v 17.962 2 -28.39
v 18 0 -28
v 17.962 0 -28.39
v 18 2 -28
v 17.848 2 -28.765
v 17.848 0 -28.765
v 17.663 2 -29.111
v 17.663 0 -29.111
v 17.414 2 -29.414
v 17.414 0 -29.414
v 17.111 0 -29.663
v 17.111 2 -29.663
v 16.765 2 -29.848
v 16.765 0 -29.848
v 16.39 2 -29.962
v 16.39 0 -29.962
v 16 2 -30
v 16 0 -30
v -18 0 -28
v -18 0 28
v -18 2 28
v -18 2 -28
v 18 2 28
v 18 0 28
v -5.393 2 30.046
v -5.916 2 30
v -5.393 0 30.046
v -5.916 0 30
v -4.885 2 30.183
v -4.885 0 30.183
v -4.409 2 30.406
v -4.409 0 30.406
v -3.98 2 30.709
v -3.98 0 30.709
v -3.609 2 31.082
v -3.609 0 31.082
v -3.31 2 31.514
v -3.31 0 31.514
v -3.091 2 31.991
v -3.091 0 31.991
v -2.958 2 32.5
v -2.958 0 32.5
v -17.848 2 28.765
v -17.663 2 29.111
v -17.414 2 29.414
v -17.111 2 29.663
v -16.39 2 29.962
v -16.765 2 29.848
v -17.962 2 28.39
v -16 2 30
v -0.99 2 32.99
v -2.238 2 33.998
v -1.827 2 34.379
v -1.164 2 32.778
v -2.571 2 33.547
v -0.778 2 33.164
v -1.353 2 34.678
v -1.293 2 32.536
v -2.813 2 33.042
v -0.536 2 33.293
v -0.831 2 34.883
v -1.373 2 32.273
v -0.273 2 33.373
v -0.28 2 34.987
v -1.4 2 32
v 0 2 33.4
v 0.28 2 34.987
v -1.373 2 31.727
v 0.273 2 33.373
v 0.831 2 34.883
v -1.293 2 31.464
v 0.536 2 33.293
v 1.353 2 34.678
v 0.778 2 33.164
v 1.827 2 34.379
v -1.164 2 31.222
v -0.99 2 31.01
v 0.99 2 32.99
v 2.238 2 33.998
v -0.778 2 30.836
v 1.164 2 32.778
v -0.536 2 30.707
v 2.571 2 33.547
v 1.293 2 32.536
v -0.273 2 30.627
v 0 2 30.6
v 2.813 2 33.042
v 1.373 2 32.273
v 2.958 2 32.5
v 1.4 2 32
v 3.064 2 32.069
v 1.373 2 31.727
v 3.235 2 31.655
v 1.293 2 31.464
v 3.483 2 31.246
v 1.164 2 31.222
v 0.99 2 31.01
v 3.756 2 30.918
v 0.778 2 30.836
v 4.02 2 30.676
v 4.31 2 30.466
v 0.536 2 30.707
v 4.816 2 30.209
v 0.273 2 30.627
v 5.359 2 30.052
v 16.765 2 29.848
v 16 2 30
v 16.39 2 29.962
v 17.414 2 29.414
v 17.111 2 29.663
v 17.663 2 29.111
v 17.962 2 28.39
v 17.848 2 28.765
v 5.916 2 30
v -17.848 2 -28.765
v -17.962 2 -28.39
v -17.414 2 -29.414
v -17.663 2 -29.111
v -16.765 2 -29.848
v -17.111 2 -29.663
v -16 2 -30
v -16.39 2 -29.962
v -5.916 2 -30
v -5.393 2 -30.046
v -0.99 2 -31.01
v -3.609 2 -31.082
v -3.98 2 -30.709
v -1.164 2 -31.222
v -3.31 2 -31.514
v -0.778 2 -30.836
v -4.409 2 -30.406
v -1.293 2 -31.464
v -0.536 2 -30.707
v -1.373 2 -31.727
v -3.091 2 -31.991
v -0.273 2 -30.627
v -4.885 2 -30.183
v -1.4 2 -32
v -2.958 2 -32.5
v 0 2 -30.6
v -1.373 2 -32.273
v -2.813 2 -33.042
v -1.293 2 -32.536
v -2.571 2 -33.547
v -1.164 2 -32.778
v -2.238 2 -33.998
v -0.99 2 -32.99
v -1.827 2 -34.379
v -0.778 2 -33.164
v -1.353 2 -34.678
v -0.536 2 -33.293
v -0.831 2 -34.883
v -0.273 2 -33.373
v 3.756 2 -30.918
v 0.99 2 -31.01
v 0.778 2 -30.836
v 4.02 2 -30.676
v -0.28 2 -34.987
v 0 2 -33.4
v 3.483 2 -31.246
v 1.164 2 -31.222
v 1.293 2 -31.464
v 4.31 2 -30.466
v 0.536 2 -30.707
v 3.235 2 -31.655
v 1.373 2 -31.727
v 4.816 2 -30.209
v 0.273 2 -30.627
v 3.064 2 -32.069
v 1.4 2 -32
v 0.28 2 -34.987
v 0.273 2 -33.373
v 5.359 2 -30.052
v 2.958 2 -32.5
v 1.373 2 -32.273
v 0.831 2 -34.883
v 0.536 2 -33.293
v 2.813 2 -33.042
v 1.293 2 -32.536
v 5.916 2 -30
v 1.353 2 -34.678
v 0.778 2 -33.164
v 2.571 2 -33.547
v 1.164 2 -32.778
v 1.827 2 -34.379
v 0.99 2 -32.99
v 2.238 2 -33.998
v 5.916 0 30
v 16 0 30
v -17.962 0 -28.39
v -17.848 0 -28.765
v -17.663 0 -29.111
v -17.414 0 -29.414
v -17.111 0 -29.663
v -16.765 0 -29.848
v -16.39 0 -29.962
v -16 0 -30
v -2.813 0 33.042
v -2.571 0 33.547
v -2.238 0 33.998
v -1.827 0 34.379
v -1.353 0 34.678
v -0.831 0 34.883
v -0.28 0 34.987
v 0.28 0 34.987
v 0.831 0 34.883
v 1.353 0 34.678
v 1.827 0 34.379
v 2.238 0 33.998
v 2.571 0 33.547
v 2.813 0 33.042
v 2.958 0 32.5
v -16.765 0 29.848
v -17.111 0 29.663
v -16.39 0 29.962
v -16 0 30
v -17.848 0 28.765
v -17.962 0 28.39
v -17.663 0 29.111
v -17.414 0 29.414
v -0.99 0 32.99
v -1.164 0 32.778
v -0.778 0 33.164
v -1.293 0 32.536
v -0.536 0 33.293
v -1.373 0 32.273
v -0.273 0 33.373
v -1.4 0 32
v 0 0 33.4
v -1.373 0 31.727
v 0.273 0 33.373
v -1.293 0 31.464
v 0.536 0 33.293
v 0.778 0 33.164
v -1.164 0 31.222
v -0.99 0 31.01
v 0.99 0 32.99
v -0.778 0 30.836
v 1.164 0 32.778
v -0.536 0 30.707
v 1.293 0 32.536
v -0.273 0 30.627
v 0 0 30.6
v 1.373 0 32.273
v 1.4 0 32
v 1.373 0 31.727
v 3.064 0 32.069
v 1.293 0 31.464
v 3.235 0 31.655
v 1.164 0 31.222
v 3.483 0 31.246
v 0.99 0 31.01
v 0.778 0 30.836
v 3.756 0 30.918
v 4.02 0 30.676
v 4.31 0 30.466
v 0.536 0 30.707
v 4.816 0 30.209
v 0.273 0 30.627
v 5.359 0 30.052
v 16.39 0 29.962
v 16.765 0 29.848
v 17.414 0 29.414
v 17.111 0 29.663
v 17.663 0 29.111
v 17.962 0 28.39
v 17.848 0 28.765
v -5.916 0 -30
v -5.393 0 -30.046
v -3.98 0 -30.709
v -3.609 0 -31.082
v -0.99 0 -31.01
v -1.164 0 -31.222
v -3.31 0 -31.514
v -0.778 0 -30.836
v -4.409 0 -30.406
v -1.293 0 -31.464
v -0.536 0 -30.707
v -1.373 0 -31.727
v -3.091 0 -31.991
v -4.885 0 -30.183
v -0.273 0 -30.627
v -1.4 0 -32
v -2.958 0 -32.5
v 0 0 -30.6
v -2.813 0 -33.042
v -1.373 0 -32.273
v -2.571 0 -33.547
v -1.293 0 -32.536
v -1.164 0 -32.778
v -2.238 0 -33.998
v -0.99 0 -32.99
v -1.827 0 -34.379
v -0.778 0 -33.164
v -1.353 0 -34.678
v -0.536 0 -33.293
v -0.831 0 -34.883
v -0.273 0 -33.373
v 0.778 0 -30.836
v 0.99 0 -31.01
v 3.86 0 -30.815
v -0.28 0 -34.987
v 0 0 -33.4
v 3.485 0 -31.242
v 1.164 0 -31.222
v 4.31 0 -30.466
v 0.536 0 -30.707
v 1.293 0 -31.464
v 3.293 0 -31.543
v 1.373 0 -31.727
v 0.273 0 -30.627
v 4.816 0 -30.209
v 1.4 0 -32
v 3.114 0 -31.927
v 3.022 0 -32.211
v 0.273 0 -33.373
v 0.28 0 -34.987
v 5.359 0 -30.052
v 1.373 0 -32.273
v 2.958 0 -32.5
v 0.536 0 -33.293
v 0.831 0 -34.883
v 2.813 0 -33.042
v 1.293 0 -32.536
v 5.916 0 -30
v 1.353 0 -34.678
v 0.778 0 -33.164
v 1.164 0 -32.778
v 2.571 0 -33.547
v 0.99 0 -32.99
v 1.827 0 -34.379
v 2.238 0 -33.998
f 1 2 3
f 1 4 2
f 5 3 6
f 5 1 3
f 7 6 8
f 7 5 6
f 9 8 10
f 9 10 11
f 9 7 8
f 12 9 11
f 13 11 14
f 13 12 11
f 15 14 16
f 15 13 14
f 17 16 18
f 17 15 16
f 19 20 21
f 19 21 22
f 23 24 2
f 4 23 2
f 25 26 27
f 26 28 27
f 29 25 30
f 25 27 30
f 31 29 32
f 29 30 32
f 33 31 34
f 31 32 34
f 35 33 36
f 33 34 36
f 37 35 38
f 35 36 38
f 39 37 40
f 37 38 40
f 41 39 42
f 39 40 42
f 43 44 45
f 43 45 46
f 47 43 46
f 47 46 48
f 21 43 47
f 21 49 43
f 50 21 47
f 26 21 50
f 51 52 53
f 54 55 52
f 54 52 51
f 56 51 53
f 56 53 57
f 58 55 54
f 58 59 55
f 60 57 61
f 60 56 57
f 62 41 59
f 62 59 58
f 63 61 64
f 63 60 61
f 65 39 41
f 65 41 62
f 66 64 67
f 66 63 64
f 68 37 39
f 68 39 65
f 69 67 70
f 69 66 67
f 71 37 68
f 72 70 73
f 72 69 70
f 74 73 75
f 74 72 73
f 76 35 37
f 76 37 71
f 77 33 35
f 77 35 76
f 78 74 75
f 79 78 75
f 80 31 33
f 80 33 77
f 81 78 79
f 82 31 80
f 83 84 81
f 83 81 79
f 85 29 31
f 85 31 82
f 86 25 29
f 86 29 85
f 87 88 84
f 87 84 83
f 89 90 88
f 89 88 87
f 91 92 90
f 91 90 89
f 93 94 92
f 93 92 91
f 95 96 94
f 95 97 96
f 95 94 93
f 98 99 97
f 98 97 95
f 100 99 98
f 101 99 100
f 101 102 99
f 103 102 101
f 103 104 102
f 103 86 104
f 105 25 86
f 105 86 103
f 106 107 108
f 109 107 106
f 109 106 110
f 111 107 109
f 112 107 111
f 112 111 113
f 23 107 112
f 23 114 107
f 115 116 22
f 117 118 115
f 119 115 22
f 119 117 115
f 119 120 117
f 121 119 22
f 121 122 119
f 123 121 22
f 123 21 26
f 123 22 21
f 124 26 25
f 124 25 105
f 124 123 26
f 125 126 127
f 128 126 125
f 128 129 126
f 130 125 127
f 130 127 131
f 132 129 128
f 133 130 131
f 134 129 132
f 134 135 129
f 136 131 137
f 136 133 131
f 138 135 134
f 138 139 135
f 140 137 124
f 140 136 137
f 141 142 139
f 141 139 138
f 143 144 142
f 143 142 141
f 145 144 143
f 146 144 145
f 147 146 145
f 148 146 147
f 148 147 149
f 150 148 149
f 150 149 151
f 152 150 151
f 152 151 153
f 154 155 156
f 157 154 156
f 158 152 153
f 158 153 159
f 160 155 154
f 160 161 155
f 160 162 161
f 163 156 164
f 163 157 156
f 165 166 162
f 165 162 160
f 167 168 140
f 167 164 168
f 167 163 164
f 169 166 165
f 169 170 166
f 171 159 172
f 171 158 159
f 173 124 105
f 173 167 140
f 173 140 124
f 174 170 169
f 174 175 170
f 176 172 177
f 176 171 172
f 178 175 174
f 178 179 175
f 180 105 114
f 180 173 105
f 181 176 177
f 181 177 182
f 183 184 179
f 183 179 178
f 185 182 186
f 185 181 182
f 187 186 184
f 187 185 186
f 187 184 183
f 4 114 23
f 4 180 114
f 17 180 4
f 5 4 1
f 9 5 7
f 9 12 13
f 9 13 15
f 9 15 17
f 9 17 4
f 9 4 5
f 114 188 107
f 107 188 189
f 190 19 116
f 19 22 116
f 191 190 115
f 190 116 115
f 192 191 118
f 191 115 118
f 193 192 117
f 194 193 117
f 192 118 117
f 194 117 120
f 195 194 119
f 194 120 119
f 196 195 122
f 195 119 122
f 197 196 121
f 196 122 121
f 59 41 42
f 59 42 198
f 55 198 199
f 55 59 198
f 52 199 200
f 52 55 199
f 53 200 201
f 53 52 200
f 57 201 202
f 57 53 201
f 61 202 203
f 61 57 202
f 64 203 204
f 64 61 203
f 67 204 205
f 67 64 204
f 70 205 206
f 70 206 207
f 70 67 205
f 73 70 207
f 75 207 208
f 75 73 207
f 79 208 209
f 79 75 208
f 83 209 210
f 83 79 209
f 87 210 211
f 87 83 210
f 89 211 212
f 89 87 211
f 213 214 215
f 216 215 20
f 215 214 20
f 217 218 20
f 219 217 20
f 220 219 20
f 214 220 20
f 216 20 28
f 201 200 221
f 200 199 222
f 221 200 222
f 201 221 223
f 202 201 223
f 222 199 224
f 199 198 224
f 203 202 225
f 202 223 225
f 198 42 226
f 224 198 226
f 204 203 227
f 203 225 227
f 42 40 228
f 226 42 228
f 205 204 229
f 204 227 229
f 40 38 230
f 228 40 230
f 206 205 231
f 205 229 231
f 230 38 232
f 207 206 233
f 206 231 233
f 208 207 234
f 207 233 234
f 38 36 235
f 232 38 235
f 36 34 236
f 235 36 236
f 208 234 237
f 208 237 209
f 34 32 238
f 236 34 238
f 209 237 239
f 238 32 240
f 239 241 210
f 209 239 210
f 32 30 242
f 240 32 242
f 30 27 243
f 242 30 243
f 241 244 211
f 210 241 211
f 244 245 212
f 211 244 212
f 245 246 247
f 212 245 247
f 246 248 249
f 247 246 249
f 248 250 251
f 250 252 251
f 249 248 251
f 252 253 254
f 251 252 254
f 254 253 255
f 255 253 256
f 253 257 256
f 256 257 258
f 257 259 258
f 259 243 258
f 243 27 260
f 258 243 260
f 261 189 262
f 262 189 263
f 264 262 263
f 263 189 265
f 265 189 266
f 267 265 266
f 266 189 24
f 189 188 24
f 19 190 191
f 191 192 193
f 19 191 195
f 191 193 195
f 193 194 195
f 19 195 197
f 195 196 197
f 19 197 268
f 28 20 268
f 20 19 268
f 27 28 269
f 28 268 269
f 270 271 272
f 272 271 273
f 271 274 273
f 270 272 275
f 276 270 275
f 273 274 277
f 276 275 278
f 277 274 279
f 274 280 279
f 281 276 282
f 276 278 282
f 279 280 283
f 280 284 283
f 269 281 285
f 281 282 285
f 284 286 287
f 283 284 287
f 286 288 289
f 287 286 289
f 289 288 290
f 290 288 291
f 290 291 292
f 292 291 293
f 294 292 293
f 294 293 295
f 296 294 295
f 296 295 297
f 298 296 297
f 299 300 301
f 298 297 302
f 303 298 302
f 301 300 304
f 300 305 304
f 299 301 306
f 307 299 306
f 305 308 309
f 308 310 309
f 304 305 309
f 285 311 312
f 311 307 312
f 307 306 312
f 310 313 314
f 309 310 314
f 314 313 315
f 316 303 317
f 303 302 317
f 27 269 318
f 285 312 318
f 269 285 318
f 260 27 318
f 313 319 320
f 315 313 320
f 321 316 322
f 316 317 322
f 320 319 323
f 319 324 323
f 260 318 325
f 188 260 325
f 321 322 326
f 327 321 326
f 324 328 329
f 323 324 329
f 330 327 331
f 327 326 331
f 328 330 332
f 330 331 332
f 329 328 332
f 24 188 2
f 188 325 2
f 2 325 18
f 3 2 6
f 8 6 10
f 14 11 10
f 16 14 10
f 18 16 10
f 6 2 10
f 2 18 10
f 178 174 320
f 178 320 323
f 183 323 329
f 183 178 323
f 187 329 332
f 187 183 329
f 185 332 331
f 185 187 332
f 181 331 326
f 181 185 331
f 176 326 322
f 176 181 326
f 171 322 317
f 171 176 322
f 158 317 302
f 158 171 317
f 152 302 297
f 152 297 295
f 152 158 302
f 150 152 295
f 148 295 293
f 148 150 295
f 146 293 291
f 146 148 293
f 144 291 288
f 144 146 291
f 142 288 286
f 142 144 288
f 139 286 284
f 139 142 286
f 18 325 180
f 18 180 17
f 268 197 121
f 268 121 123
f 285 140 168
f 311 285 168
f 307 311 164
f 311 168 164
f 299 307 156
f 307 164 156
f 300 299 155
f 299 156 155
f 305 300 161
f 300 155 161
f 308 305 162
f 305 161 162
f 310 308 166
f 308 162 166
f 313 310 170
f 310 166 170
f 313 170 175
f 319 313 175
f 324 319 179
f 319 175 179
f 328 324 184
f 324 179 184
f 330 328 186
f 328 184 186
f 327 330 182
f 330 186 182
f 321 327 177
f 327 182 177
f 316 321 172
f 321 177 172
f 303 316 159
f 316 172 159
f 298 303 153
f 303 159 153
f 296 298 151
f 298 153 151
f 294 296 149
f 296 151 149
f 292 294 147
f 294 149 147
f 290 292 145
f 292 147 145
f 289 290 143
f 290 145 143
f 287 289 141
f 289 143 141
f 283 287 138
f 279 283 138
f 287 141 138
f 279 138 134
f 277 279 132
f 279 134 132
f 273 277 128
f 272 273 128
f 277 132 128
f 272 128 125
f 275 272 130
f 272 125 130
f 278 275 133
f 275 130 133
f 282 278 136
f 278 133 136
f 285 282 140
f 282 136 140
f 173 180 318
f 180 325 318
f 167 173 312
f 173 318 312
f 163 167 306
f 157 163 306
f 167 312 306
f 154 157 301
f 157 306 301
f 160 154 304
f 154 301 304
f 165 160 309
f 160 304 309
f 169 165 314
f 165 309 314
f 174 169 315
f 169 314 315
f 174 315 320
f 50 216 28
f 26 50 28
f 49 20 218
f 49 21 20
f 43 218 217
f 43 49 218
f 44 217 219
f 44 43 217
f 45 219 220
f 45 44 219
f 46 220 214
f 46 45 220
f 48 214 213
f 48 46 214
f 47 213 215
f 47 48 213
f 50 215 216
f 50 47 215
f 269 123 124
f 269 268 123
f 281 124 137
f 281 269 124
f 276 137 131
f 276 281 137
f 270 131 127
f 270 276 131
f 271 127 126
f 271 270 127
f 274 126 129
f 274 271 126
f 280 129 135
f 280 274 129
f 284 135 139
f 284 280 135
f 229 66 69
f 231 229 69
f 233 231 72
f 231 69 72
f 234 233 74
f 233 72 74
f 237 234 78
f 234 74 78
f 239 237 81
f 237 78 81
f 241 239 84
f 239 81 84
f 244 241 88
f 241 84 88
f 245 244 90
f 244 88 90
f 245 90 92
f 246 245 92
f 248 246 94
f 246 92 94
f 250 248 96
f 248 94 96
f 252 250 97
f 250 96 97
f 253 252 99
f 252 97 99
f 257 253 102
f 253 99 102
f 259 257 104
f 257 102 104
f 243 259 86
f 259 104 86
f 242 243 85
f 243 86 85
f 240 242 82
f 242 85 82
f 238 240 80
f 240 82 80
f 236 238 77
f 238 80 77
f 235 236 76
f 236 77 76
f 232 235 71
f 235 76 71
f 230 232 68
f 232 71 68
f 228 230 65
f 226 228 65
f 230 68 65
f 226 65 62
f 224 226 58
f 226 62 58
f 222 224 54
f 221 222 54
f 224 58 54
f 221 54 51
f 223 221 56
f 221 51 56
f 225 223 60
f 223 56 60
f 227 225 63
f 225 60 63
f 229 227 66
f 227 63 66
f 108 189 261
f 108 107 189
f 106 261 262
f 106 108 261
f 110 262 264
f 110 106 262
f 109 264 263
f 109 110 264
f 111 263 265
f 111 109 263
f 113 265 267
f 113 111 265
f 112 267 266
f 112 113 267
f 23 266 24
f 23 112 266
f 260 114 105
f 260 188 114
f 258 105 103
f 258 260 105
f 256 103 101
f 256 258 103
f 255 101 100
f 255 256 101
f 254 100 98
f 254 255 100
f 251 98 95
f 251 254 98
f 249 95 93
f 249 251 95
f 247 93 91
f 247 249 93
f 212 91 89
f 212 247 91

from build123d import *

# Parameters (mm, degrees)
SKETCH_1_W      = 36
SKETCH_1_H      = 60
EXTRUDE_1_DEPTH = 2
FILLET_1_R      = 2
SKETCH_2_R      = 1.4
EXTRUDE_2_DEPTH = 2
FILLET_2_R      = 3


with BuildPart() as part:
    # 草图1 → 凸台-拉伸1 (new body)
    with BuildSketch(Plane(origin=(0, 0, 0), x_dir=(1, 0, 0), z_dir=(0, 1, 0))):
        Rectangle(SKETCH_1_W, SKETCH_1_H)
    extrude(amount=EXTRUDE_1_DEPTH)

    # 圆角1
    fillet_1_edges = [part.edges().sort_by_distance(p)[0] for p in [
        (-18, 1, -30),
        (18, 1, -30),
        (18, 1, 30),
        (-18, 1, 30),
    ]]
    fillet(fillet_1_edges, radius=FILLET_1_R)

    # 草图2 → 凸台-拉伸2 (add)
    # profile 1 of 2: a face of its own
    with BuildSketch(Plane(origin=(0, 2, 0), x_dir=(1, 0, 0), z_dir=(0, 1, 0))):
        with BuildLine():
            ThreePointArc((2.236067977, 30), (2.802517077, 30.929533731), (3, 32))
            ThreePointArc((3, 32), (-1.070466269, 34.802517077), (-2.236067977, 30))
            Line((-2.236067977, 30), (2.236067977, 30))
        make_face()
        with Locations(Location((0, 32, 0), (0, 0, 270))):
            Circle(SKETCH_2_R, mode=Mode.SUBTRACT)
    # profile 2 of 2: a face of its own
    with BuildSketch(Plane(origin=(0, 2, 0), x_dir=(1, 0, 0), z_dir=(0, 1, 0))):
        with BuildLine():
            ThreePointArc((-2.236067977, -30), (-1.070466269, -34.802517077), (3, -32))
            ThreePointArc((3, -32), (2.802517077, -30.929533731), (2.236067977, -30))
            Line((2.236067977, -30), (-2.236067977, -30))
        make_face()
        with Locations(Location((0, -32, 0), (0, 0, 270))):
            Circle(SKETCH_2_R, mode=Mode.SUBTRACT)
    extrude(amount=-EXTRUDE_2_DEPTH)

    # 圆角2
    fillet_2_edges = [part.edges().sort_by_distance(p)[0] for p in [
        (2.236067977, 1, -30),
        (-2.236067977, 1, -30),
        (2.236067977, 1, 30),
        (-2.236067977, 1, 30),
    ]]
    fillet(fillet_2_edges, radius=FILLET_2_R)


solid = part.part
